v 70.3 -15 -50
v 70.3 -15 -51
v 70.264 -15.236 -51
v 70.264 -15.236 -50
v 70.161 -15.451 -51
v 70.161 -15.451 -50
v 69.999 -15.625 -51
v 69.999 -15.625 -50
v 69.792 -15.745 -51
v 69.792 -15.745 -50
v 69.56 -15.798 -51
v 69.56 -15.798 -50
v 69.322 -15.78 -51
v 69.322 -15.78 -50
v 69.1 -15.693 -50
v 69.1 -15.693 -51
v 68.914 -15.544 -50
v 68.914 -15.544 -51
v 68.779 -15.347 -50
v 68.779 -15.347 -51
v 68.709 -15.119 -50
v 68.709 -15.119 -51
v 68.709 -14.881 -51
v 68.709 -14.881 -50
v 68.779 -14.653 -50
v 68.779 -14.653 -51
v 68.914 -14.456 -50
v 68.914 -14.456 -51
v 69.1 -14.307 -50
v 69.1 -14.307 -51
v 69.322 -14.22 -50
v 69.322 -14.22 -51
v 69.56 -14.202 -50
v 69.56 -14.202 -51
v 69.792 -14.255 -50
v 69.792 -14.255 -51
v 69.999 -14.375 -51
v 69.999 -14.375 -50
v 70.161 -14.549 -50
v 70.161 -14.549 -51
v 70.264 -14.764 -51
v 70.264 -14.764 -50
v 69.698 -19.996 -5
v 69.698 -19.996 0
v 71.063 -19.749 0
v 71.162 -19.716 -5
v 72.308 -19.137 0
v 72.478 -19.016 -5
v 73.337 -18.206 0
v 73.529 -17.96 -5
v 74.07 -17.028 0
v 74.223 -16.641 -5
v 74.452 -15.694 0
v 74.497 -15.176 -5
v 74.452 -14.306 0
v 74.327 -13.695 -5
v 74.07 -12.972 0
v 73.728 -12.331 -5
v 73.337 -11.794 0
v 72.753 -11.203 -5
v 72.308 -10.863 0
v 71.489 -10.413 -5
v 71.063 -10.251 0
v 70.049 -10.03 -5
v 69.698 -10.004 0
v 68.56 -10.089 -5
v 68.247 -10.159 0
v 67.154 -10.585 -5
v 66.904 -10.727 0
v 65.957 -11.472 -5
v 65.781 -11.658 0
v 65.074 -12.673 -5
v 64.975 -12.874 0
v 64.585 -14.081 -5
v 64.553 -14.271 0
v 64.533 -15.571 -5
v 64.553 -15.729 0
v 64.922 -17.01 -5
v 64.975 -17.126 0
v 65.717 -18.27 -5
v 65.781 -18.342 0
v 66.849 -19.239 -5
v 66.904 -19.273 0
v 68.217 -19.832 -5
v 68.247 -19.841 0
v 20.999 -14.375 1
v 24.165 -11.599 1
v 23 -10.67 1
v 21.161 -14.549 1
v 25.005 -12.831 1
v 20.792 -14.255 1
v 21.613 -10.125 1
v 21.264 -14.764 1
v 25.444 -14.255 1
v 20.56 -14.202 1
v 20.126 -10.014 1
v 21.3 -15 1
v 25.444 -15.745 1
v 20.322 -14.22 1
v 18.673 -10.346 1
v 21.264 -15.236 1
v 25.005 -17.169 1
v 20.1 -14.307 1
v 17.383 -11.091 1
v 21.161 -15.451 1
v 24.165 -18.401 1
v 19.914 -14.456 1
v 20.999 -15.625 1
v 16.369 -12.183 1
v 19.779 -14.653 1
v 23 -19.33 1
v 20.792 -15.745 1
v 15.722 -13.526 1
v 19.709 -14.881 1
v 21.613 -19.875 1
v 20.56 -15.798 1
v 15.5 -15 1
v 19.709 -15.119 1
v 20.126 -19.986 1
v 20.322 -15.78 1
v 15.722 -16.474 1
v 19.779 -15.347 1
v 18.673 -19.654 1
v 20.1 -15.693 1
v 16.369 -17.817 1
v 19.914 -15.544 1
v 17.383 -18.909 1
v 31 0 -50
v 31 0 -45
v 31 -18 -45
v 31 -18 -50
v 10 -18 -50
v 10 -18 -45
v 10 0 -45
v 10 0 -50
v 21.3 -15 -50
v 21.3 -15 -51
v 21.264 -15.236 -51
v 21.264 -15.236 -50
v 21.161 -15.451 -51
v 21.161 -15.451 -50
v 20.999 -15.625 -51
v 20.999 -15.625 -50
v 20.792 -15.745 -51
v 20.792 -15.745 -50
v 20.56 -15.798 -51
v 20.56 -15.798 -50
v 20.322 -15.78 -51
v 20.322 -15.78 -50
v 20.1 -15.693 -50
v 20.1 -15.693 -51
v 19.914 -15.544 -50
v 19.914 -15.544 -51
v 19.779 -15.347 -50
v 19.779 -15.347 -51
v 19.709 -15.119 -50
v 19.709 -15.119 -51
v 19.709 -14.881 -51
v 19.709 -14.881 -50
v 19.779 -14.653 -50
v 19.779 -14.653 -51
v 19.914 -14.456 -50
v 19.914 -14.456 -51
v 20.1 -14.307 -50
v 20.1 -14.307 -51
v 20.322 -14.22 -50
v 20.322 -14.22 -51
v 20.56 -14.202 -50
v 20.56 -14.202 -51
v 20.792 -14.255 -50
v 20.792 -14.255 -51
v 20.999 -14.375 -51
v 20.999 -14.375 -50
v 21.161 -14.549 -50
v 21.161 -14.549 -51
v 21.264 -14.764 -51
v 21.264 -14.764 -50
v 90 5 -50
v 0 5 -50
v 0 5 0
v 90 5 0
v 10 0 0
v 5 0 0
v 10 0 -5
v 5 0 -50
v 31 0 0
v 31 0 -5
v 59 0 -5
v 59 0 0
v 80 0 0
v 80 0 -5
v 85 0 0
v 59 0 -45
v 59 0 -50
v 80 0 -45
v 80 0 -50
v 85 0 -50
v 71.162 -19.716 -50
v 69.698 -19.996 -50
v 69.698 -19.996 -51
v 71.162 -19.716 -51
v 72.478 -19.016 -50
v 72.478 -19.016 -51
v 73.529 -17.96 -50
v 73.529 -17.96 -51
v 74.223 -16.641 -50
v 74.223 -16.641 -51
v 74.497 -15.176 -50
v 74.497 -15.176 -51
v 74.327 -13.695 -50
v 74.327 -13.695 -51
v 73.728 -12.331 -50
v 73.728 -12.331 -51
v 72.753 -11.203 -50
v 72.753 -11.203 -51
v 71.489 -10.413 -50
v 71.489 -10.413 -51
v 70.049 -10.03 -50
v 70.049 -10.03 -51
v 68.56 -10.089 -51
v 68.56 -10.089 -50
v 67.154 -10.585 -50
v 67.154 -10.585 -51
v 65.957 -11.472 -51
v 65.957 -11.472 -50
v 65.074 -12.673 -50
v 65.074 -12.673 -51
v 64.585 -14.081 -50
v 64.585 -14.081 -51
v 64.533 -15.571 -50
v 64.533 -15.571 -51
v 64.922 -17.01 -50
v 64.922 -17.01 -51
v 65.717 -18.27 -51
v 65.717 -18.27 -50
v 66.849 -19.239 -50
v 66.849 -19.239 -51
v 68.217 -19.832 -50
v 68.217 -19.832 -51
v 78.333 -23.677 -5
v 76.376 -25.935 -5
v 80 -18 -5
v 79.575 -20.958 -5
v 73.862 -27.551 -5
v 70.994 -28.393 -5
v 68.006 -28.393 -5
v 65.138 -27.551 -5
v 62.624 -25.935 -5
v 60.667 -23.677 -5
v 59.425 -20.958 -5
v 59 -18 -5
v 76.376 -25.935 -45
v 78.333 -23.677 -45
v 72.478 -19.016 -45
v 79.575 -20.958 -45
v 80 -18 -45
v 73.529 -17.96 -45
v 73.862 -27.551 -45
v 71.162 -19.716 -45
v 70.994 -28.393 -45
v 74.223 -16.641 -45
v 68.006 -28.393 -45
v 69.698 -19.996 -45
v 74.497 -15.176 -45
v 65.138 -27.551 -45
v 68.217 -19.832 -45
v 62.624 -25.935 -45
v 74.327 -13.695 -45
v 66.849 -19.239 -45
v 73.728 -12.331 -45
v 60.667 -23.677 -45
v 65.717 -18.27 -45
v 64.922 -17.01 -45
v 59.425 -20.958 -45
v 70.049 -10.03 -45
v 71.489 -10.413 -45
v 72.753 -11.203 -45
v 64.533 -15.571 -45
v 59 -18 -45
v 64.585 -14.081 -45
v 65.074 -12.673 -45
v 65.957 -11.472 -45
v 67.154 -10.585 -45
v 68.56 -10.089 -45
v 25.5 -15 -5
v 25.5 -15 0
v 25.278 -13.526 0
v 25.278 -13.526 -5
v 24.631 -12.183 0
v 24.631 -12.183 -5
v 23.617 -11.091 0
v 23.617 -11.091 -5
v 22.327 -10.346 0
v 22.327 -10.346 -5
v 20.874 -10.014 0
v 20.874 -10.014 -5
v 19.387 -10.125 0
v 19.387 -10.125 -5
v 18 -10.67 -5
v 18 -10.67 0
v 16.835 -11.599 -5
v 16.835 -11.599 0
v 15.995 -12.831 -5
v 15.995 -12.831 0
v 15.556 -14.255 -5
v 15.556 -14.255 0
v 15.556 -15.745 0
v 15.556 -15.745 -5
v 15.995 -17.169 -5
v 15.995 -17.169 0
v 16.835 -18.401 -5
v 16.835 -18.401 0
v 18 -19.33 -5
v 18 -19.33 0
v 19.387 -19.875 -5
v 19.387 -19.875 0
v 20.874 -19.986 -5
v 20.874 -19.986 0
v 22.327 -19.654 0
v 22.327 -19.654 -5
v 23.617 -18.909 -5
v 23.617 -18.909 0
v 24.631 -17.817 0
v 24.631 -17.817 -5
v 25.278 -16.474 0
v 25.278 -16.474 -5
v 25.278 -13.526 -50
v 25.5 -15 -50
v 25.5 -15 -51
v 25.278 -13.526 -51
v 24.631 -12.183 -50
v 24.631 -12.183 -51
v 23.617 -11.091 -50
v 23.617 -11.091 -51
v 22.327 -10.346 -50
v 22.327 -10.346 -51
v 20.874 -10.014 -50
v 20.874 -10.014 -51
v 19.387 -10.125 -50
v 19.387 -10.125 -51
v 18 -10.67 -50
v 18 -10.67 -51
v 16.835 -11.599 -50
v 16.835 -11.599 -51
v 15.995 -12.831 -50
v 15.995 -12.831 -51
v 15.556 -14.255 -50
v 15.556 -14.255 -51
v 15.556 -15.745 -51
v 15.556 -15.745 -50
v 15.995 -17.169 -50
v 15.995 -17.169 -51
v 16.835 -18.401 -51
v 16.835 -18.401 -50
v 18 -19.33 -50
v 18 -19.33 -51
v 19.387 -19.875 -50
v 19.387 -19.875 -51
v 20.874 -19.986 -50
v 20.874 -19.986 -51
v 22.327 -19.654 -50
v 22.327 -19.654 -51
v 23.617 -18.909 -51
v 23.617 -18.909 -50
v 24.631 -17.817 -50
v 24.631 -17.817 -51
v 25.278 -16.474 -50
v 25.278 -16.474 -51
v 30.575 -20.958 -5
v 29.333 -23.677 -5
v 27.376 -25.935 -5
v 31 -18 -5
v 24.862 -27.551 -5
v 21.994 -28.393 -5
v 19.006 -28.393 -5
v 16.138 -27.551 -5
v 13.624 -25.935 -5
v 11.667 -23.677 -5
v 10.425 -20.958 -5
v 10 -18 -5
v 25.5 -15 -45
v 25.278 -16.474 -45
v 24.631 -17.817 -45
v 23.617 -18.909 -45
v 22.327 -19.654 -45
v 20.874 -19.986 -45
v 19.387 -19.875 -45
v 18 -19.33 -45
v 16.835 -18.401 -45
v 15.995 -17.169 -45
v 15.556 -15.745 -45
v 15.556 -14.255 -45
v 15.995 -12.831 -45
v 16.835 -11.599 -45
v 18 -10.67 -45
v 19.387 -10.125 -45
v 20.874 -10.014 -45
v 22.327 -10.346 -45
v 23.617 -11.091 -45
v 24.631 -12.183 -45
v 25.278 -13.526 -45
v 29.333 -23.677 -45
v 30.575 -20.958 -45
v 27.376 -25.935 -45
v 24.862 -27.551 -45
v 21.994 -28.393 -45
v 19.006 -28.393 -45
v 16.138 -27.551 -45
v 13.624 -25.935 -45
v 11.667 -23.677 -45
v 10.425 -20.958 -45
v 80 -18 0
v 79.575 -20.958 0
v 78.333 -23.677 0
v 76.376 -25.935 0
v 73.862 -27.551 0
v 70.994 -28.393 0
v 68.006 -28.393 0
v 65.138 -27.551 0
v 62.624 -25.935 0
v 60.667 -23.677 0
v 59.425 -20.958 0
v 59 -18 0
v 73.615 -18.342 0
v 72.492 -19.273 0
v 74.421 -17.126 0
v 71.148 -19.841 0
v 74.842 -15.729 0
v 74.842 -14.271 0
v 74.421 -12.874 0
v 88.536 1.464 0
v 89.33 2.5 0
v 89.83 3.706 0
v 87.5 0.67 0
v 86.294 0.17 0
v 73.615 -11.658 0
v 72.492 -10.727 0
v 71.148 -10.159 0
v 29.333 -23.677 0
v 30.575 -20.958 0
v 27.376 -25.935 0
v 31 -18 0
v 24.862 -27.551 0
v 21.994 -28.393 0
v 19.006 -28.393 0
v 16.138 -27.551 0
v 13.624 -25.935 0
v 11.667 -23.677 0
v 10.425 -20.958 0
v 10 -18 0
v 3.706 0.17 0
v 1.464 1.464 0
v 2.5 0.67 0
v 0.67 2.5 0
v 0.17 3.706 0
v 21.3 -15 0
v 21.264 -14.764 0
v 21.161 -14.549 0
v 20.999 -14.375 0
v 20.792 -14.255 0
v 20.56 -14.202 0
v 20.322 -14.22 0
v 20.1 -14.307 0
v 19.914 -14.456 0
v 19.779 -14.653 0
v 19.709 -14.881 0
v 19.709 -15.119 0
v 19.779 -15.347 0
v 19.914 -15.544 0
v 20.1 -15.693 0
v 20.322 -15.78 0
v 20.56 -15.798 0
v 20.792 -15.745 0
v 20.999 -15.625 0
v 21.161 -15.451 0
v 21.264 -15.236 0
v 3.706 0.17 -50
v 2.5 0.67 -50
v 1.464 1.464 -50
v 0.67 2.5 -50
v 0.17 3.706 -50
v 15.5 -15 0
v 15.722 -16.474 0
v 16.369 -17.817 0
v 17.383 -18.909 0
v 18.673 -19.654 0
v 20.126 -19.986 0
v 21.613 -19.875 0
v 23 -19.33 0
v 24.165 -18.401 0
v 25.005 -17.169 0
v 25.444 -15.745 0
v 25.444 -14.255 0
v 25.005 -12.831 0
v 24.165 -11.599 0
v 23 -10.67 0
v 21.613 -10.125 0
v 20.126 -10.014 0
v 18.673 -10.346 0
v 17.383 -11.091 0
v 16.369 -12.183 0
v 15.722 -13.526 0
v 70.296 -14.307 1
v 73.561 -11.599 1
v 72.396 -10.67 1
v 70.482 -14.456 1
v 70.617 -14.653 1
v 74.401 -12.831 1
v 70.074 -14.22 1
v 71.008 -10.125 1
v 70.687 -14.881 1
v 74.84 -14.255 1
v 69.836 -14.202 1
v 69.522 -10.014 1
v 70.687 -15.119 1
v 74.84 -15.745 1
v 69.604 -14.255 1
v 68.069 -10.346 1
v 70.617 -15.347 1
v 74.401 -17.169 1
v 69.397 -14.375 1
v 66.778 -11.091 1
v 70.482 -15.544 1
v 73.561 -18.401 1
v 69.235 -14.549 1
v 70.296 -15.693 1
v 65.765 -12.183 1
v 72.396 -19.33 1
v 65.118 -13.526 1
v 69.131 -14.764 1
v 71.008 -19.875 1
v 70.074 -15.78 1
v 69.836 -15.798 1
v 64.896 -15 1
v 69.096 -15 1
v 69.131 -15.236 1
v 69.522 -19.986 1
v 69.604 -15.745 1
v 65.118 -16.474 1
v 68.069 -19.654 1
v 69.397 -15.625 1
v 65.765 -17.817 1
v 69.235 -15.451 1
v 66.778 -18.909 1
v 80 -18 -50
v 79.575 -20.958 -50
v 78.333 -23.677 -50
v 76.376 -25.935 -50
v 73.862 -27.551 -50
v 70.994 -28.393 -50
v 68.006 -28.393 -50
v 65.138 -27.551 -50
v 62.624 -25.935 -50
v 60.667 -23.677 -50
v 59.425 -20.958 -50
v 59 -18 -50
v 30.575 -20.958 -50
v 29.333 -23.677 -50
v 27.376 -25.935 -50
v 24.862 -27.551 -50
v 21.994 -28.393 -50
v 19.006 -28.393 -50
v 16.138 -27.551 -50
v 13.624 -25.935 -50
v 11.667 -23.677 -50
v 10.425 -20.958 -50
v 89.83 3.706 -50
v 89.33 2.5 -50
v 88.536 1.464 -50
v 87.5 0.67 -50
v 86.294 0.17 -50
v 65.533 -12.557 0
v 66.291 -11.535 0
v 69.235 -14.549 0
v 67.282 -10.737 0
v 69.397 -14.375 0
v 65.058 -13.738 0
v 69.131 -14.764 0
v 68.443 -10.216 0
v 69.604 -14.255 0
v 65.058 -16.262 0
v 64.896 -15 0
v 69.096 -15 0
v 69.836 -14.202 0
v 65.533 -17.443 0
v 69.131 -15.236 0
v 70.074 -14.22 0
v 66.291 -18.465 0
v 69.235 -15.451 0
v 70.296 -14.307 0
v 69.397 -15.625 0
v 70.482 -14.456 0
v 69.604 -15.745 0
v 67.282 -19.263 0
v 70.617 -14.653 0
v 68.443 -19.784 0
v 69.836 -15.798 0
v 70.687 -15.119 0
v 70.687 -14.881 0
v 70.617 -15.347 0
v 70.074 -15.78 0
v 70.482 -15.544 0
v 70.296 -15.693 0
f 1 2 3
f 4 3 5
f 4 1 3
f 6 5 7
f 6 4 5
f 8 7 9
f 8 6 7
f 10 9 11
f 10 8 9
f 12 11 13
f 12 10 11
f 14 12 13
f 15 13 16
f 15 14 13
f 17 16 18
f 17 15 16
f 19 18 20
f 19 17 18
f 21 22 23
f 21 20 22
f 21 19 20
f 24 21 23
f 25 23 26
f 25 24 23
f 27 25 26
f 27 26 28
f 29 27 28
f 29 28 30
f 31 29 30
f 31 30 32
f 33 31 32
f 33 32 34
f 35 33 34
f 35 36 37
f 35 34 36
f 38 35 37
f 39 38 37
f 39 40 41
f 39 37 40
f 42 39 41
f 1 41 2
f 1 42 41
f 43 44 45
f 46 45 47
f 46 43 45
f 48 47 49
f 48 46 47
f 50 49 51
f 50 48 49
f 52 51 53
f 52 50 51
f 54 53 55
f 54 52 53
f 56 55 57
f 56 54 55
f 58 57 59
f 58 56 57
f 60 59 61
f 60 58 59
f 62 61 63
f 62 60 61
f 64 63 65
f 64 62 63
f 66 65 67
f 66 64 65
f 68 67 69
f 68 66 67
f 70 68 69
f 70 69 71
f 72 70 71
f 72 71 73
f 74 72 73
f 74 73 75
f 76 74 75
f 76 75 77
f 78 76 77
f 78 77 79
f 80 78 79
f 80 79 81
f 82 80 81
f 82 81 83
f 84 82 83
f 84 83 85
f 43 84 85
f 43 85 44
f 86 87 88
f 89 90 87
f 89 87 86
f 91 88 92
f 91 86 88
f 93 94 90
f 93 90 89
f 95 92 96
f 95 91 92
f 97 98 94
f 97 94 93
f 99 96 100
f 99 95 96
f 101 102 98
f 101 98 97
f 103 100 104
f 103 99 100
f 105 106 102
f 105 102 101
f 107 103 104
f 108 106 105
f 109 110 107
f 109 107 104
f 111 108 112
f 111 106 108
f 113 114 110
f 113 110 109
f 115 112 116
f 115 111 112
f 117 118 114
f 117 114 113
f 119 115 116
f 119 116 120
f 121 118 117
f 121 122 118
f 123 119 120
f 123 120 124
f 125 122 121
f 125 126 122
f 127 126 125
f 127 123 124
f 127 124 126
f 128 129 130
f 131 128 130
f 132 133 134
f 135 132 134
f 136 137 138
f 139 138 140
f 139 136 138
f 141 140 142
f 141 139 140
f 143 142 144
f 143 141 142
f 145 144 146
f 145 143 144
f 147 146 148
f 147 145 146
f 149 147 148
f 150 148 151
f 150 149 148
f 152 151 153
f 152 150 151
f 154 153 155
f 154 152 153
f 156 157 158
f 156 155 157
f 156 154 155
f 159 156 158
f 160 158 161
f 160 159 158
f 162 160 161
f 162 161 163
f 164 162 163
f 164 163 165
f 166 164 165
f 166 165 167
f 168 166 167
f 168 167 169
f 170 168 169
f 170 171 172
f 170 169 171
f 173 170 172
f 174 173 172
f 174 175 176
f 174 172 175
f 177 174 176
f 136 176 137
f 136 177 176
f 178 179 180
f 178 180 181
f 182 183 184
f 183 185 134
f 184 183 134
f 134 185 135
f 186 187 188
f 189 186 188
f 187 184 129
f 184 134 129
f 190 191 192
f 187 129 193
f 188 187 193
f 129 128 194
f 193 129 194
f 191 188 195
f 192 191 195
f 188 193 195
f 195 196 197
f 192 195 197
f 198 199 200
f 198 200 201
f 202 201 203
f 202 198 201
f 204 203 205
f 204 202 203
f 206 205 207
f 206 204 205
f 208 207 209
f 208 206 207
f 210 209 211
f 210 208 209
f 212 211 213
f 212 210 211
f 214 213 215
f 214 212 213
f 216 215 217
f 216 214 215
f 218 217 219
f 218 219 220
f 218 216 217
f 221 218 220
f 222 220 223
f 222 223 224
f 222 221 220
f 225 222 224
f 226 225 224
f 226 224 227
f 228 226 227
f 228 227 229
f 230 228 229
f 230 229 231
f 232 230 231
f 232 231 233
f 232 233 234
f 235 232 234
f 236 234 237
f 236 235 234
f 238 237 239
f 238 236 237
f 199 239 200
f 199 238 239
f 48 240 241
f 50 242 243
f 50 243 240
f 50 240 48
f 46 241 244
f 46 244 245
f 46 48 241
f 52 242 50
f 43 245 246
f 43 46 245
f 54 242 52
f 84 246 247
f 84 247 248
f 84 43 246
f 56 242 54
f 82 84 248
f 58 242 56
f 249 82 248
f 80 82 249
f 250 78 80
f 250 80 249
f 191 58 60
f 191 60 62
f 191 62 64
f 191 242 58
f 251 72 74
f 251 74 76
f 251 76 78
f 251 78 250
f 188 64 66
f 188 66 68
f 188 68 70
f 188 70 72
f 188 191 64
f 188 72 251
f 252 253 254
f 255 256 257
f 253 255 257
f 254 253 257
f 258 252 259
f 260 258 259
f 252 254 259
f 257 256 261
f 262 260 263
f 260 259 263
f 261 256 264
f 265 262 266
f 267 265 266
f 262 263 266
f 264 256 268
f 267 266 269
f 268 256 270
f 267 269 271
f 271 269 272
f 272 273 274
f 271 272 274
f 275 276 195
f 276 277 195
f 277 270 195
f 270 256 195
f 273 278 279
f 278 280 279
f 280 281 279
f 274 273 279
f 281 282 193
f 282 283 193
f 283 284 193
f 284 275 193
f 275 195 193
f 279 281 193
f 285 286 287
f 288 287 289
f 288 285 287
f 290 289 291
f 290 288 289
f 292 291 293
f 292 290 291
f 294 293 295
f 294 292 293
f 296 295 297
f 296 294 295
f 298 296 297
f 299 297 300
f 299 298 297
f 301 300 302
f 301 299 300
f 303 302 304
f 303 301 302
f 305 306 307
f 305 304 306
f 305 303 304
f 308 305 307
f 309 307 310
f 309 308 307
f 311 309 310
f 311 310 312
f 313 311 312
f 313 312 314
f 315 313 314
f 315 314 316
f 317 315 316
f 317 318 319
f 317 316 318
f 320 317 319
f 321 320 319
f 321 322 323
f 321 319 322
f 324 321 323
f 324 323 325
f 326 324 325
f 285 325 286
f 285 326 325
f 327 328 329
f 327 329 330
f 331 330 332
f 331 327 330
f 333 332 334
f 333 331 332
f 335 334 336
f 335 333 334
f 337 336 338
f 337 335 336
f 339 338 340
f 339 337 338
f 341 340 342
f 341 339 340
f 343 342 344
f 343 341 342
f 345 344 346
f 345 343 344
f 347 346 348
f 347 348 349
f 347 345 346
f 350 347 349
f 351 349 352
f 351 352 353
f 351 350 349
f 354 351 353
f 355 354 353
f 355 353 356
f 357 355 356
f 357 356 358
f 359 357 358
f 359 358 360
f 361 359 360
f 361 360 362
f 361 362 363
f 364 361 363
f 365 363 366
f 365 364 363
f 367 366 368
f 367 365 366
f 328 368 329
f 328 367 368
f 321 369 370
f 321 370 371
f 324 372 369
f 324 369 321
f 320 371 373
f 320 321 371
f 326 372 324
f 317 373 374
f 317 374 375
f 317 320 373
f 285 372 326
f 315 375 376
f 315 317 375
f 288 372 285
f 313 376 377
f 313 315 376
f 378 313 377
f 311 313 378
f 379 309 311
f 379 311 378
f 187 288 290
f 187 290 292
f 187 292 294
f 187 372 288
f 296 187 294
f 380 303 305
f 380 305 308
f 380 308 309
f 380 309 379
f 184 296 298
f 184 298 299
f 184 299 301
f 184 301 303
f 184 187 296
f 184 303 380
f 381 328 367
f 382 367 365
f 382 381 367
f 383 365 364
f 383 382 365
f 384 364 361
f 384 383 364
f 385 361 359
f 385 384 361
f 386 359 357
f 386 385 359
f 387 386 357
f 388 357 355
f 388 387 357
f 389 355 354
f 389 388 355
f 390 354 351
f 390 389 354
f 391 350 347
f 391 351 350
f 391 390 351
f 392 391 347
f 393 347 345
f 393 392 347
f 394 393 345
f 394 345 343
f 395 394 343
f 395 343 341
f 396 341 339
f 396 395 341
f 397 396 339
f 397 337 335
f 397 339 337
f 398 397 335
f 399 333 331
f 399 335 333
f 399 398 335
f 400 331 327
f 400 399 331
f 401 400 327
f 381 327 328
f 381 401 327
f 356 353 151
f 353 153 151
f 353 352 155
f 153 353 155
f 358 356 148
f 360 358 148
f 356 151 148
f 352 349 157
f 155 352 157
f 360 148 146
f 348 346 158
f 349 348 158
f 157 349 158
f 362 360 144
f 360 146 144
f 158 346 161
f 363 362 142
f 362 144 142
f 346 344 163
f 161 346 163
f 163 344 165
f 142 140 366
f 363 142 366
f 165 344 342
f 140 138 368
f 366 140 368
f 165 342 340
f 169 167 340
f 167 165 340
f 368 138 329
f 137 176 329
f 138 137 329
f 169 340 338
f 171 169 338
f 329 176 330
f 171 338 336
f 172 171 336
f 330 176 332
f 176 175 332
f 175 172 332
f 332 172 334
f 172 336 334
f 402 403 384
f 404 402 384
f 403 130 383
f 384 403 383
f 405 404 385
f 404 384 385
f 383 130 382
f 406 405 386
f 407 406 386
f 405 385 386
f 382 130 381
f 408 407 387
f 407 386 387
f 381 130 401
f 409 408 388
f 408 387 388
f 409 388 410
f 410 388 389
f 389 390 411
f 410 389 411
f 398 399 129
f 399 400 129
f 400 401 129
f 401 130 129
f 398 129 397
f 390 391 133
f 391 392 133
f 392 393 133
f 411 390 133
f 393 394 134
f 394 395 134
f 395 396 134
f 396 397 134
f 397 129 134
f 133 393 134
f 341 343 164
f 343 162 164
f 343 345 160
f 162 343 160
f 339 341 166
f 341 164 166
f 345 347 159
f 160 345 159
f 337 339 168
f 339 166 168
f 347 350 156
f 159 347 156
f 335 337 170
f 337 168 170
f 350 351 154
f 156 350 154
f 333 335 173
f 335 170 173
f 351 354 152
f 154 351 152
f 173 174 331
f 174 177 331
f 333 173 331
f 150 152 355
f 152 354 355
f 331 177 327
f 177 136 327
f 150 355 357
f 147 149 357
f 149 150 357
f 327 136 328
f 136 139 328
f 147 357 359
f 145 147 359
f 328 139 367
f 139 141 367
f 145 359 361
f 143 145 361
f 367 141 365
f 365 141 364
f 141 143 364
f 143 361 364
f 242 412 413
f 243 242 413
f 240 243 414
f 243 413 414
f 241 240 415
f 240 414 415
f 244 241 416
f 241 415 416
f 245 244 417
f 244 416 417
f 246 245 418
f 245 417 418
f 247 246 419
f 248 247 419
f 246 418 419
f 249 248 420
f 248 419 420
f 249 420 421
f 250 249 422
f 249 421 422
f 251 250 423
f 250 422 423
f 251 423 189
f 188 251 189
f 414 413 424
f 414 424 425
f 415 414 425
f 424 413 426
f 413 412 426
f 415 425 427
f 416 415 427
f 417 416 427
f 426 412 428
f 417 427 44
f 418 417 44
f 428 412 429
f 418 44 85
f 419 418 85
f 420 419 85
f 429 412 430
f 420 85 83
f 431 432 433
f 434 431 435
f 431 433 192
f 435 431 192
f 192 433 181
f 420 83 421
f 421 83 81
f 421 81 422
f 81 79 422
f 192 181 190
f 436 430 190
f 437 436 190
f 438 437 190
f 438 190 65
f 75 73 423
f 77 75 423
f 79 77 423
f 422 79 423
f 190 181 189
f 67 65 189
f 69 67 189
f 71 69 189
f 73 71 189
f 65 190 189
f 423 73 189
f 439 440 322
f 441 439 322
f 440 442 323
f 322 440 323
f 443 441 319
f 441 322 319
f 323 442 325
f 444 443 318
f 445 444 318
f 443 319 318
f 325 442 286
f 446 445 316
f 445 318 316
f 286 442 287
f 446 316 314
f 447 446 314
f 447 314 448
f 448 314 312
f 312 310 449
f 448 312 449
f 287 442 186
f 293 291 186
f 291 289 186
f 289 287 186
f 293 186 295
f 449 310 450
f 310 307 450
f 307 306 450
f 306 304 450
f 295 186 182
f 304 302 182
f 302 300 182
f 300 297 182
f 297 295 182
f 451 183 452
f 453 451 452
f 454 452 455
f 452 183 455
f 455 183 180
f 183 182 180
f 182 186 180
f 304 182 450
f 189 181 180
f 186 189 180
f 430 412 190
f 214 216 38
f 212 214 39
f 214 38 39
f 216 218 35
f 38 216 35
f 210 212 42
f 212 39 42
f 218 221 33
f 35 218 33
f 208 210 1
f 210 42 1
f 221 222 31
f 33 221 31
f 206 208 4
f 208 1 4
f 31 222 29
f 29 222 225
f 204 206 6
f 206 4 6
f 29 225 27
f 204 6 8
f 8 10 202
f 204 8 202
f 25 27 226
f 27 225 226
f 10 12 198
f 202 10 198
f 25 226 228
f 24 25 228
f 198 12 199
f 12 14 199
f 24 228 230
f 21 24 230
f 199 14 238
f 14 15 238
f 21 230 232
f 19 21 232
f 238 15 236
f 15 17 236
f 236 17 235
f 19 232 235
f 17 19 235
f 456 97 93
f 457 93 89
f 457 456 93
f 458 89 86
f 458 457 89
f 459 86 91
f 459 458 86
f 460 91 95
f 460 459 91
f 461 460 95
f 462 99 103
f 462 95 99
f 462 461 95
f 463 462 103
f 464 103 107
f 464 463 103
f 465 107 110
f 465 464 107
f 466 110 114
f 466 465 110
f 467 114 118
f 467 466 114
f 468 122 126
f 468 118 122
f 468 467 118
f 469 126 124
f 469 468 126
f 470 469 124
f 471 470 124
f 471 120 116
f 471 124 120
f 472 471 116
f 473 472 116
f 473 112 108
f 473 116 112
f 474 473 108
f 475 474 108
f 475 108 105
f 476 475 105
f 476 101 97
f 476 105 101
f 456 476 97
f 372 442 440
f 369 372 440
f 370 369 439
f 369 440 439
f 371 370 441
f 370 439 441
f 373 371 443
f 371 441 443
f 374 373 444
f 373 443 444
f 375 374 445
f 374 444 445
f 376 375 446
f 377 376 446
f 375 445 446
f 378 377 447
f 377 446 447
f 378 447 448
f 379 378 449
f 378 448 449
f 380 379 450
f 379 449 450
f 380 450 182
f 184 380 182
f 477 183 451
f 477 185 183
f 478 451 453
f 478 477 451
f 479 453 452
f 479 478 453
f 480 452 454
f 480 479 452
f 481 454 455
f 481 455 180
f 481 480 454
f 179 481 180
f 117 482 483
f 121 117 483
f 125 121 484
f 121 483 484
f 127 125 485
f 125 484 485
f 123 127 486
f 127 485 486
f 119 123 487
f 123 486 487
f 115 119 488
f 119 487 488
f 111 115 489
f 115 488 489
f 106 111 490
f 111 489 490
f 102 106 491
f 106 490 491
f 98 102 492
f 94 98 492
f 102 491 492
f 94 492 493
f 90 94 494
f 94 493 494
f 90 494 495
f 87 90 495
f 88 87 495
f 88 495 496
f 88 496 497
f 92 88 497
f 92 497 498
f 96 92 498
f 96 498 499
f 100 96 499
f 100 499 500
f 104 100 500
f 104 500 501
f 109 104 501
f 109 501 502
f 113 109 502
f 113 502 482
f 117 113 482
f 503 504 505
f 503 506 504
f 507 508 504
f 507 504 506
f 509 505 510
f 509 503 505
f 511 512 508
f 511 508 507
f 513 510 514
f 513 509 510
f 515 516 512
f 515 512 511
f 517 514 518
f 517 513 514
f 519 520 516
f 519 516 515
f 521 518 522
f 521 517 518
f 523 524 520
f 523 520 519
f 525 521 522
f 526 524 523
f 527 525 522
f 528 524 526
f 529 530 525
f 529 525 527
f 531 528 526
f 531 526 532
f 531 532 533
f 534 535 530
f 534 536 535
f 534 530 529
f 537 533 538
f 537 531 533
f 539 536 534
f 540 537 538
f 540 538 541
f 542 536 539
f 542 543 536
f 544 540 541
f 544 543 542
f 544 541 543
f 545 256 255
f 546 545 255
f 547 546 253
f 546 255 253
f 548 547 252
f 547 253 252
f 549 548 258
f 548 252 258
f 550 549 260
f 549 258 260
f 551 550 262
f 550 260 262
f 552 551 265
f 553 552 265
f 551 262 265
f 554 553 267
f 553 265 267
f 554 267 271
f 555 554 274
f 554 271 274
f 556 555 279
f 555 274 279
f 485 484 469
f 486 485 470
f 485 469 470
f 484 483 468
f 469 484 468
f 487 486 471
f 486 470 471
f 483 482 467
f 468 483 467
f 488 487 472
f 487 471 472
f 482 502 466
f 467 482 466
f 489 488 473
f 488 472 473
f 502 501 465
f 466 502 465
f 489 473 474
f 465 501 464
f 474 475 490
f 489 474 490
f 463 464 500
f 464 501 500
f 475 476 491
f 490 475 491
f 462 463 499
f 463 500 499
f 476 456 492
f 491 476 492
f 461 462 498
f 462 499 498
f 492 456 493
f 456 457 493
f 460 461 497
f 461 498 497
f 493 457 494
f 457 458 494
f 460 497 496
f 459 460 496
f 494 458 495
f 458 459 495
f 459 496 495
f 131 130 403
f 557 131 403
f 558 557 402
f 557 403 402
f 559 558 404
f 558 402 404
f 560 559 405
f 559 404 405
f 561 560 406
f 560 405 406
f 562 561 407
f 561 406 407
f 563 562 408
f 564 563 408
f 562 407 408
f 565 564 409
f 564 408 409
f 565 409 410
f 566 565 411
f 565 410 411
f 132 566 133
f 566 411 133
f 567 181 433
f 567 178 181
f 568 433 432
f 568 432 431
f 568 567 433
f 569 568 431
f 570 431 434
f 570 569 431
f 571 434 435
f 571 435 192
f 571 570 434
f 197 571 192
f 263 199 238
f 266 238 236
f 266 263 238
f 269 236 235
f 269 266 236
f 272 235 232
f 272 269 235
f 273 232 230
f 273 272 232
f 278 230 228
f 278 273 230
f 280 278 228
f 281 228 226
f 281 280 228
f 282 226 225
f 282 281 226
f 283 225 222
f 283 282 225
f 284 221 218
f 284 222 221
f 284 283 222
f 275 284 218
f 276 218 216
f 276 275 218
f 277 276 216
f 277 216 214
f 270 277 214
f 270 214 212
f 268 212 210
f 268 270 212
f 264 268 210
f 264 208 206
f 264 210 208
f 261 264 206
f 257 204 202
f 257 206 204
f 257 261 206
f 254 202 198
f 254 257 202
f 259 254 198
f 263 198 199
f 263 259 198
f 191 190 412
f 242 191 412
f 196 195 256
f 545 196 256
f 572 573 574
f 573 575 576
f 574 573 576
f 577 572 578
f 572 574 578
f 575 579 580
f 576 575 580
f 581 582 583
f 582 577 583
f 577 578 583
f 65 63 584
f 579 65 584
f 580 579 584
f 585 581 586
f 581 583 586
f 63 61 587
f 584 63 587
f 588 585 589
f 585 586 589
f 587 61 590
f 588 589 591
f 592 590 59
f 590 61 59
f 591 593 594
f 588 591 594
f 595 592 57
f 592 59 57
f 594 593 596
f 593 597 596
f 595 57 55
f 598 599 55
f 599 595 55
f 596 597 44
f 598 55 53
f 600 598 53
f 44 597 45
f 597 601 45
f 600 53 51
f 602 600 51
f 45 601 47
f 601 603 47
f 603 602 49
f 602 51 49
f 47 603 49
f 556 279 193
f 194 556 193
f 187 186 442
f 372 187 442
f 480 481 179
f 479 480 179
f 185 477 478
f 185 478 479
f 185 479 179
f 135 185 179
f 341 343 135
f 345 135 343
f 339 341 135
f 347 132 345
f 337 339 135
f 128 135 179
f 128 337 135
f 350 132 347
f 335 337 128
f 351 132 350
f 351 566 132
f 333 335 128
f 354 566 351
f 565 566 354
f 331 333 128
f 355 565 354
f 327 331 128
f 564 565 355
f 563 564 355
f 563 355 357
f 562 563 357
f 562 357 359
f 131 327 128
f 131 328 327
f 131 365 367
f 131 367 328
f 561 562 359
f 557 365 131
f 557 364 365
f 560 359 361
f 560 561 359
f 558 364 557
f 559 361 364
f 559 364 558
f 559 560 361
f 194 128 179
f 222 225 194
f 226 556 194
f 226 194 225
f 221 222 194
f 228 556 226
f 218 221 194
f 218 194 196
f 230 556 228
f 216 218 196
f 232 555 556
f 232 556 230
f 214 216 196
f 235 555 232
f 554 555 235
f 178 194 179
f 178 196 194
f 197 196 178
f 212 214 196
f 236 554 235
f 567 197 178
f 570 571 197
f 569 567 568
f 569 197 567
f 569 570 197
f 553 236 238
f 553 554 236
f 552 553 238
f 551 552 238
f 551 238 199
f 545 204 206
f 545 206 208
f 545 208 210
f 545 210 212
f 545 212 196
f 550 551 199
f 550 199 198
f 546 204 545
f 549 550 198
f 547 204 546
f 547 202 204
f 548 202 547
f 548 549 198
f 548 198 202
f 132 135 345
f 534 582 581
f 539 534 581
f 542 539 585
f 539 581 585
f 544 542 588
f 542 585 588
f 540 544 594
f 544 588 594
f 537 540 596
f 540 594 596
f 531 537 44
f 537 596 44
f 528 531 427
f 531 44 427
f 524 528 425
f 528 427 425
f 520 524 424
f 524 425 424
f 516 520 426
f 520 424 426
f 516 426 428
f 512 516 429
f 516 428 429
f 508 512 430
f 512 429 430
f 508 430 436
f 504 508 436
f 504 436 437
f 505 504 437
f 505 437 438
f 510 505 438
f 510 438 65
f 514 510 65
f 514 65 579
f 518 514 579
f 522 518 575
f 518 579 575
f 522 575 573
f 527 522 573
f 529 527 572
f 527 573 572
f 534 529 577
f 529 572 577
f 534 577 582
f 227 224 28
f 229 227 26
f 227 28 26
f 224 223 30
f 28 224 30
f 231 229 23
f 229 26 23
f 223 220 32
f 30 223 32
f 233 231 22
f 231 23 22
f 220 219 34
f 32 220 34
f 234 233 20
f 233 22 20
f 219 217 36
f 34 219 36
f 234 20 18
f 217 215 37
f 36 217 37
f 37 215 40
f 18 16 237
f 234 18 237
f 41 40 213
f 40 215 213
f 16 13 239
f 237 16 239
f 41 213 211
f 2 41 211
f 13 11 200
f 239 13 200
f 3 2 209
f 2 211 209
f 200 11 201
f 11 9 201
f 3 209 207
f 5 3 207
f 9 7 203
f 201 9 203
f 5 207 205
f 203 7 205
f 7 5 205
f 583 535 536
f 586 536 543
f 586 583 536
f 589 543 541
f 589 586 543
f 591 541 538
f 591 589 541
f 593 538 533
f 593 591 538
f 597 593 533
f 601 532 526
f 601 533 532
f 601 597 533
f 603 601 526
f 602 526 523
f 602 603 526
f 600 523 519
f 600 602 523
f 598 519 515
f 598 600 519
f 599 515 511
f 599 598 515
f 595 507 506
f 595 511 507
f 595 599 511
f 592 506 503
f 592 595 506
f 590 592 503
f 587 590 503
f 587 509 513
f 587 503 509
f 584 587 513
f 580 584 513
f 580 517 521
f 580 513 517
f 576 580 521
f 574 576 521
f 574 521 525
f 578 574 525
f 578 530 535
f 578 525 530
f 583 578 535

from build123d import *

# Parameters (mm, degrees)
SKETCH1_W           = 90
SKETCH1_H           = 50
BOSS_EXTRUDE1_DEPTH = 5
FILLET6_R           = 5
FILLET7_R           = 5
SKETCH2_R           = 5
BOSS_EXTRUDE3_DEPTH = 5
BOSS_EXTRUDE4_START = -45
BOSS_EXTRUDE4_DEPTH = 5
SKETCH9_R           = 5
BOSS_EXTRUDE5_DEPTH = 1
CUT_EXTRUDE1_START  = -5
SKETCH11_R          = 5
CUT_EXTRUDE1_DEPTH  = 5
SKETCH12_R          = 5
BOSS_EXTRUDE7_DEPTH = 1
CUT_EXTRUDE2_START  = -5
SKETCH14_R          = 5
CUT_EXTRUDE2_DEPTH  = 5
SKETCH16_R          = 0.8
CUT_EXTRUDE6_DEPTH  = 5
SKETCH17_R          = 0.8
CUT_EXTRUDE8_DEPTH  = 5


with BuildPart() as part:
    # Sketch1 → Boss-Extrude1 (new body)
    with BuildSketch(Plane(origin=(0, 0, 0), x_dir=(1, 0, 0), z_dir=(0, 1, 0))):
        with Locations((45, 25)):
            Rectangle(SKETCH1_W, SKETCH1_H)
    extrude(amount=BOSS_EXTRUDE1_DEPTH)

    # Fillet6
    fillet6_edges = [part.edges().sort_by_distance(p)[0] for p in [
        (90, 0, -25),
    ]]
    fillet(fillet6_edges, radius=FILLET6_R - 0.0001)  # a hair under: the kernel refuses the full size

    # Fillet7
    fillet7_edges = [part.edges().sort_by_distance(p)[0] for p in [
        (0, 0, -25),
    ]]
    fillet(fillet7_edges, radius=FILLET7_R - 0.0001)  # a hair under: the kernel refuses the full size

    # Sketch2 → Boss-Extrude3 (add)
    # profile 1 of 4: a face of its own
    with BuildSketch(Plane.XY):
        with BuildLine():
            ThreePointArc((31, -18), (20.5, -28.5), (10, -18))
            Line((10, -18), (10, 0))
            Line((10, 0), (31, 0))
            Line((31, 0), (31, -18))
        make_face()
        with Locations((20.5, -15)):
            Circle(SKETCH2_R, mode=Mode.SUBTRACT)
    # profile 2 of 4: a face of its own
    with BuildSketch(Plane.XY):
        with BuildLine():
            Line((59, -18), (59, 0))
            Line((59, 0), (80, 0))
            Line((80, 0), (80, -18))
            ThreePointArc((80, -18), (69.5, -28.5), (59, -18))
        make_face()
        with Locations((69.5, -15)):
            Circle(SKETCH2_R, mode=Mode.SUBTRACT)
    # profile 3 of 4: a face of its own
    with BuildSketch(Plane.XY):
        with Locations((20.5, -15)):
            Circle(SKETCH2_R)
    # profile 4 of 4: a face of its own
    with BuildSketch(Plane.XY):
        with Locations((69.5, -15)):
            Circle(SKETCH2_R)
    extrude(amount=-BOSS_EXTRUDE3_DEPTH)

    # Sketch7 → Boss-Extrude4 (add)
    with BuildSketch(Plane.XY.offset(BOSS_EXTRUDE4_START)):
        with BuildLine():
            Line((80, 0), (80, -18))
            ThreePointArc((80, -18), (69.5, -28.5), (59, -18))
            Line((59, -18), (59, 0))
            Line((59, 0), (80, 0))
        make_face()
        with BuildLine():
            Line((31, 0), (31, -18))
            ThreePointArc((31, -18), (20.5, -28.5), (10, -18))
            Line((10, -18), (10, 0))
            Line((10, 0), (31, 0))
        make_face()
    extrude(amount=-BOSS_EXTRUDE4_DEPTH)

    # Sketch9 → Boss-Extrude5 (add)
    with BuildSketch(Plane.XY):
        with Locations(Location((20.5, -15, 0), (0, 0, 180))):
            Circle(SKETCH9_R)
        with Locations(Location((69.895831462, -15, 0), (0, 0, 180))):
            Circle(SKETCH9_R)
    extrude(amount=BOSS_EXTRUDE5_DEPTH)

    # Sketch11 → Cut-Extrude1 (cut)
    with BuildSketch(Plane.XY.offset(CUT_EXTRUDE1_START)):
        with Locations((20.5, -15)):
            Circle(SKETCH11_R)
        with Locations(Location((69.5, -15, 0), (0, 0, 272.268539879))):
            Circle(SKETCH11_R)
    extrude(amount=CUT_EXTRUDE1_DEPTH, mode=Mode.SUBTRACT)


with BuildPart() as cut_extrude1_piece_1:
    # of the separate pieces the step leaves, piece 1, a body of its own (cut_extrude1_pieces)
    add(part.part.solids().sort_by_distance((4.9999, 0, 0))[0])

    # Sketch12 → Boss-Extrude7 (add)
    with BuildSketch(Plane.XY.offset(-50)):
        with Locations((20.5, -15)):
            Circle(SKETCH12_R)
        with Locations(Location((69.5, -15, 0), (0, 0, 272.268539879))):
            Circle(SKETCH12_R)
    extrude(amount=-BOSS_EXTRUDE7_DEPTH)

    # Sketch14 → Cut-Extrude2 (cut)
    with BuildSketch(Plane(origin=(0, 0, -50), x_dir=(-1, 0, 0), z_dir=(0, 0, -1)).offset(CUT_EXTRUDE2_START)):
        with Locations(Location((-69.5, -15, 0), (0, 0, 267.731460121))):
            Circle(SKETCH14_R)
        with Locations(Location((-20.5, -15, 0), (0, 0, 180))):
            Circle(SKETCH14_R)
    extrude(amount=CUT_EXTRUDE2_DEPTH, mode=Mode.SUBTRACT)


with BuildPart() as cut_extrude1_piece_2:
    # of the separate pieces the step leaves, piece 2, a body of its own (cut_extrude1_pieces)
    add(part.part.solids().sort_by_distance((15.5, -15, 1))[0])


with BuildPart() as cut_extrude2_piece_1:
    # of the separate pieces the step leaves, piece 1, a body of its own (cut_extrude2_pieces)
    add(cut_extrude1_piece_1.part.solids().sort_by_distance((4.9999, 0, 0))[0])


with BuildPart() as cut_extrude2_piece_2:
    # of the separate pieces the step leaves, piece 2, a body of its own (cut_extrude2_pieces)
    add(cut_extrude1_piece_1.part.solids().sort_by_distance((25.5, -15, -51))[0])


with BuildPart() as cut_extrude2_piece_3:
    # of the separate pieces the step leaves, piece 3, a body of its own (cut_extrude2_pieces)
    add(cut_extrude1_piece_1.part.solids().sort_by_distance((69.697915731, -19.996081401, -51))[0])


with BuildPart() as cut_extrude6_tool:
    # Sketch16 → Cut-Extrude6 (new body)
    with BuildSketch(Plane(origin=(0, 0, -50), x_dir=(-1, 0, 0), z_dir=(0, 0, -1))):
        with Locations(Location((-69.5, -15, 0), (0, 0, 180))):
            Circle(SKETCH16_R)
        with Locations(Location((-20.5, -15, 0), (0, 0, 180))):
            Circle(SKETCH16_R)
    extrude(amount=CUT_EXTRUDE6_DEPTH)


with BuildPart() as cut_extrude2_piece_2_1:
    add(cut_extrude2_piece_2.part)

    # Cut-Extrude6: cut by cut_extrude6_tool
    add(cut_extrude6_tool.part, mode=Mode.SUBTRACT)


with BuildPart() as cut_extrude2_piece_3_1:
    add(cut_extrude2_piece_3.part)

    # Cut-Extrude6: cut by cut_extrude6_tool
    add(cut_extrude6_tool.part, mode=Mode.SUBTRACT)


with BuildPart() as cut_extrude8_tool:
    # Sketch17 → Cut-Extrude8 (new body)
    with BuildSketch(Plane.XY):
        with Locations((20.5, -15)):
            Circle(SKETCH17_R)
        with Locations(Location((69.895831462, -15, 0), (0, 0, 180))):
            Circle(SKETCH17_R)
    extrude(amount=CUT_EXTRUDE8_DEPTH)


with BuildPart() as cut_extrude1_piece_2_1:
    add(cut_extrude1_piece_2.part)

    # Cut-Extrude8: cut by cut_extrude8_tool
    add(cut_extrude8_tool.part, mode=Mode.SUBTRACT)


with BuildPart() as cut_extrude2_piece_1_1:
    add(cut_extrude2_piece_1.part)

    # Cut-Extrude8: cut by cut_extrude8_tool
    add(cut_extrude8_tool.part, mode=Mode.SUBTRACT)


solid = Compound([cut_extrude2_piece_2_1.part, cut_extrude2_piece_3_1.part, cut_extrude1_piece_2_1.part, cut_extrude2_piece_1_1.part])
